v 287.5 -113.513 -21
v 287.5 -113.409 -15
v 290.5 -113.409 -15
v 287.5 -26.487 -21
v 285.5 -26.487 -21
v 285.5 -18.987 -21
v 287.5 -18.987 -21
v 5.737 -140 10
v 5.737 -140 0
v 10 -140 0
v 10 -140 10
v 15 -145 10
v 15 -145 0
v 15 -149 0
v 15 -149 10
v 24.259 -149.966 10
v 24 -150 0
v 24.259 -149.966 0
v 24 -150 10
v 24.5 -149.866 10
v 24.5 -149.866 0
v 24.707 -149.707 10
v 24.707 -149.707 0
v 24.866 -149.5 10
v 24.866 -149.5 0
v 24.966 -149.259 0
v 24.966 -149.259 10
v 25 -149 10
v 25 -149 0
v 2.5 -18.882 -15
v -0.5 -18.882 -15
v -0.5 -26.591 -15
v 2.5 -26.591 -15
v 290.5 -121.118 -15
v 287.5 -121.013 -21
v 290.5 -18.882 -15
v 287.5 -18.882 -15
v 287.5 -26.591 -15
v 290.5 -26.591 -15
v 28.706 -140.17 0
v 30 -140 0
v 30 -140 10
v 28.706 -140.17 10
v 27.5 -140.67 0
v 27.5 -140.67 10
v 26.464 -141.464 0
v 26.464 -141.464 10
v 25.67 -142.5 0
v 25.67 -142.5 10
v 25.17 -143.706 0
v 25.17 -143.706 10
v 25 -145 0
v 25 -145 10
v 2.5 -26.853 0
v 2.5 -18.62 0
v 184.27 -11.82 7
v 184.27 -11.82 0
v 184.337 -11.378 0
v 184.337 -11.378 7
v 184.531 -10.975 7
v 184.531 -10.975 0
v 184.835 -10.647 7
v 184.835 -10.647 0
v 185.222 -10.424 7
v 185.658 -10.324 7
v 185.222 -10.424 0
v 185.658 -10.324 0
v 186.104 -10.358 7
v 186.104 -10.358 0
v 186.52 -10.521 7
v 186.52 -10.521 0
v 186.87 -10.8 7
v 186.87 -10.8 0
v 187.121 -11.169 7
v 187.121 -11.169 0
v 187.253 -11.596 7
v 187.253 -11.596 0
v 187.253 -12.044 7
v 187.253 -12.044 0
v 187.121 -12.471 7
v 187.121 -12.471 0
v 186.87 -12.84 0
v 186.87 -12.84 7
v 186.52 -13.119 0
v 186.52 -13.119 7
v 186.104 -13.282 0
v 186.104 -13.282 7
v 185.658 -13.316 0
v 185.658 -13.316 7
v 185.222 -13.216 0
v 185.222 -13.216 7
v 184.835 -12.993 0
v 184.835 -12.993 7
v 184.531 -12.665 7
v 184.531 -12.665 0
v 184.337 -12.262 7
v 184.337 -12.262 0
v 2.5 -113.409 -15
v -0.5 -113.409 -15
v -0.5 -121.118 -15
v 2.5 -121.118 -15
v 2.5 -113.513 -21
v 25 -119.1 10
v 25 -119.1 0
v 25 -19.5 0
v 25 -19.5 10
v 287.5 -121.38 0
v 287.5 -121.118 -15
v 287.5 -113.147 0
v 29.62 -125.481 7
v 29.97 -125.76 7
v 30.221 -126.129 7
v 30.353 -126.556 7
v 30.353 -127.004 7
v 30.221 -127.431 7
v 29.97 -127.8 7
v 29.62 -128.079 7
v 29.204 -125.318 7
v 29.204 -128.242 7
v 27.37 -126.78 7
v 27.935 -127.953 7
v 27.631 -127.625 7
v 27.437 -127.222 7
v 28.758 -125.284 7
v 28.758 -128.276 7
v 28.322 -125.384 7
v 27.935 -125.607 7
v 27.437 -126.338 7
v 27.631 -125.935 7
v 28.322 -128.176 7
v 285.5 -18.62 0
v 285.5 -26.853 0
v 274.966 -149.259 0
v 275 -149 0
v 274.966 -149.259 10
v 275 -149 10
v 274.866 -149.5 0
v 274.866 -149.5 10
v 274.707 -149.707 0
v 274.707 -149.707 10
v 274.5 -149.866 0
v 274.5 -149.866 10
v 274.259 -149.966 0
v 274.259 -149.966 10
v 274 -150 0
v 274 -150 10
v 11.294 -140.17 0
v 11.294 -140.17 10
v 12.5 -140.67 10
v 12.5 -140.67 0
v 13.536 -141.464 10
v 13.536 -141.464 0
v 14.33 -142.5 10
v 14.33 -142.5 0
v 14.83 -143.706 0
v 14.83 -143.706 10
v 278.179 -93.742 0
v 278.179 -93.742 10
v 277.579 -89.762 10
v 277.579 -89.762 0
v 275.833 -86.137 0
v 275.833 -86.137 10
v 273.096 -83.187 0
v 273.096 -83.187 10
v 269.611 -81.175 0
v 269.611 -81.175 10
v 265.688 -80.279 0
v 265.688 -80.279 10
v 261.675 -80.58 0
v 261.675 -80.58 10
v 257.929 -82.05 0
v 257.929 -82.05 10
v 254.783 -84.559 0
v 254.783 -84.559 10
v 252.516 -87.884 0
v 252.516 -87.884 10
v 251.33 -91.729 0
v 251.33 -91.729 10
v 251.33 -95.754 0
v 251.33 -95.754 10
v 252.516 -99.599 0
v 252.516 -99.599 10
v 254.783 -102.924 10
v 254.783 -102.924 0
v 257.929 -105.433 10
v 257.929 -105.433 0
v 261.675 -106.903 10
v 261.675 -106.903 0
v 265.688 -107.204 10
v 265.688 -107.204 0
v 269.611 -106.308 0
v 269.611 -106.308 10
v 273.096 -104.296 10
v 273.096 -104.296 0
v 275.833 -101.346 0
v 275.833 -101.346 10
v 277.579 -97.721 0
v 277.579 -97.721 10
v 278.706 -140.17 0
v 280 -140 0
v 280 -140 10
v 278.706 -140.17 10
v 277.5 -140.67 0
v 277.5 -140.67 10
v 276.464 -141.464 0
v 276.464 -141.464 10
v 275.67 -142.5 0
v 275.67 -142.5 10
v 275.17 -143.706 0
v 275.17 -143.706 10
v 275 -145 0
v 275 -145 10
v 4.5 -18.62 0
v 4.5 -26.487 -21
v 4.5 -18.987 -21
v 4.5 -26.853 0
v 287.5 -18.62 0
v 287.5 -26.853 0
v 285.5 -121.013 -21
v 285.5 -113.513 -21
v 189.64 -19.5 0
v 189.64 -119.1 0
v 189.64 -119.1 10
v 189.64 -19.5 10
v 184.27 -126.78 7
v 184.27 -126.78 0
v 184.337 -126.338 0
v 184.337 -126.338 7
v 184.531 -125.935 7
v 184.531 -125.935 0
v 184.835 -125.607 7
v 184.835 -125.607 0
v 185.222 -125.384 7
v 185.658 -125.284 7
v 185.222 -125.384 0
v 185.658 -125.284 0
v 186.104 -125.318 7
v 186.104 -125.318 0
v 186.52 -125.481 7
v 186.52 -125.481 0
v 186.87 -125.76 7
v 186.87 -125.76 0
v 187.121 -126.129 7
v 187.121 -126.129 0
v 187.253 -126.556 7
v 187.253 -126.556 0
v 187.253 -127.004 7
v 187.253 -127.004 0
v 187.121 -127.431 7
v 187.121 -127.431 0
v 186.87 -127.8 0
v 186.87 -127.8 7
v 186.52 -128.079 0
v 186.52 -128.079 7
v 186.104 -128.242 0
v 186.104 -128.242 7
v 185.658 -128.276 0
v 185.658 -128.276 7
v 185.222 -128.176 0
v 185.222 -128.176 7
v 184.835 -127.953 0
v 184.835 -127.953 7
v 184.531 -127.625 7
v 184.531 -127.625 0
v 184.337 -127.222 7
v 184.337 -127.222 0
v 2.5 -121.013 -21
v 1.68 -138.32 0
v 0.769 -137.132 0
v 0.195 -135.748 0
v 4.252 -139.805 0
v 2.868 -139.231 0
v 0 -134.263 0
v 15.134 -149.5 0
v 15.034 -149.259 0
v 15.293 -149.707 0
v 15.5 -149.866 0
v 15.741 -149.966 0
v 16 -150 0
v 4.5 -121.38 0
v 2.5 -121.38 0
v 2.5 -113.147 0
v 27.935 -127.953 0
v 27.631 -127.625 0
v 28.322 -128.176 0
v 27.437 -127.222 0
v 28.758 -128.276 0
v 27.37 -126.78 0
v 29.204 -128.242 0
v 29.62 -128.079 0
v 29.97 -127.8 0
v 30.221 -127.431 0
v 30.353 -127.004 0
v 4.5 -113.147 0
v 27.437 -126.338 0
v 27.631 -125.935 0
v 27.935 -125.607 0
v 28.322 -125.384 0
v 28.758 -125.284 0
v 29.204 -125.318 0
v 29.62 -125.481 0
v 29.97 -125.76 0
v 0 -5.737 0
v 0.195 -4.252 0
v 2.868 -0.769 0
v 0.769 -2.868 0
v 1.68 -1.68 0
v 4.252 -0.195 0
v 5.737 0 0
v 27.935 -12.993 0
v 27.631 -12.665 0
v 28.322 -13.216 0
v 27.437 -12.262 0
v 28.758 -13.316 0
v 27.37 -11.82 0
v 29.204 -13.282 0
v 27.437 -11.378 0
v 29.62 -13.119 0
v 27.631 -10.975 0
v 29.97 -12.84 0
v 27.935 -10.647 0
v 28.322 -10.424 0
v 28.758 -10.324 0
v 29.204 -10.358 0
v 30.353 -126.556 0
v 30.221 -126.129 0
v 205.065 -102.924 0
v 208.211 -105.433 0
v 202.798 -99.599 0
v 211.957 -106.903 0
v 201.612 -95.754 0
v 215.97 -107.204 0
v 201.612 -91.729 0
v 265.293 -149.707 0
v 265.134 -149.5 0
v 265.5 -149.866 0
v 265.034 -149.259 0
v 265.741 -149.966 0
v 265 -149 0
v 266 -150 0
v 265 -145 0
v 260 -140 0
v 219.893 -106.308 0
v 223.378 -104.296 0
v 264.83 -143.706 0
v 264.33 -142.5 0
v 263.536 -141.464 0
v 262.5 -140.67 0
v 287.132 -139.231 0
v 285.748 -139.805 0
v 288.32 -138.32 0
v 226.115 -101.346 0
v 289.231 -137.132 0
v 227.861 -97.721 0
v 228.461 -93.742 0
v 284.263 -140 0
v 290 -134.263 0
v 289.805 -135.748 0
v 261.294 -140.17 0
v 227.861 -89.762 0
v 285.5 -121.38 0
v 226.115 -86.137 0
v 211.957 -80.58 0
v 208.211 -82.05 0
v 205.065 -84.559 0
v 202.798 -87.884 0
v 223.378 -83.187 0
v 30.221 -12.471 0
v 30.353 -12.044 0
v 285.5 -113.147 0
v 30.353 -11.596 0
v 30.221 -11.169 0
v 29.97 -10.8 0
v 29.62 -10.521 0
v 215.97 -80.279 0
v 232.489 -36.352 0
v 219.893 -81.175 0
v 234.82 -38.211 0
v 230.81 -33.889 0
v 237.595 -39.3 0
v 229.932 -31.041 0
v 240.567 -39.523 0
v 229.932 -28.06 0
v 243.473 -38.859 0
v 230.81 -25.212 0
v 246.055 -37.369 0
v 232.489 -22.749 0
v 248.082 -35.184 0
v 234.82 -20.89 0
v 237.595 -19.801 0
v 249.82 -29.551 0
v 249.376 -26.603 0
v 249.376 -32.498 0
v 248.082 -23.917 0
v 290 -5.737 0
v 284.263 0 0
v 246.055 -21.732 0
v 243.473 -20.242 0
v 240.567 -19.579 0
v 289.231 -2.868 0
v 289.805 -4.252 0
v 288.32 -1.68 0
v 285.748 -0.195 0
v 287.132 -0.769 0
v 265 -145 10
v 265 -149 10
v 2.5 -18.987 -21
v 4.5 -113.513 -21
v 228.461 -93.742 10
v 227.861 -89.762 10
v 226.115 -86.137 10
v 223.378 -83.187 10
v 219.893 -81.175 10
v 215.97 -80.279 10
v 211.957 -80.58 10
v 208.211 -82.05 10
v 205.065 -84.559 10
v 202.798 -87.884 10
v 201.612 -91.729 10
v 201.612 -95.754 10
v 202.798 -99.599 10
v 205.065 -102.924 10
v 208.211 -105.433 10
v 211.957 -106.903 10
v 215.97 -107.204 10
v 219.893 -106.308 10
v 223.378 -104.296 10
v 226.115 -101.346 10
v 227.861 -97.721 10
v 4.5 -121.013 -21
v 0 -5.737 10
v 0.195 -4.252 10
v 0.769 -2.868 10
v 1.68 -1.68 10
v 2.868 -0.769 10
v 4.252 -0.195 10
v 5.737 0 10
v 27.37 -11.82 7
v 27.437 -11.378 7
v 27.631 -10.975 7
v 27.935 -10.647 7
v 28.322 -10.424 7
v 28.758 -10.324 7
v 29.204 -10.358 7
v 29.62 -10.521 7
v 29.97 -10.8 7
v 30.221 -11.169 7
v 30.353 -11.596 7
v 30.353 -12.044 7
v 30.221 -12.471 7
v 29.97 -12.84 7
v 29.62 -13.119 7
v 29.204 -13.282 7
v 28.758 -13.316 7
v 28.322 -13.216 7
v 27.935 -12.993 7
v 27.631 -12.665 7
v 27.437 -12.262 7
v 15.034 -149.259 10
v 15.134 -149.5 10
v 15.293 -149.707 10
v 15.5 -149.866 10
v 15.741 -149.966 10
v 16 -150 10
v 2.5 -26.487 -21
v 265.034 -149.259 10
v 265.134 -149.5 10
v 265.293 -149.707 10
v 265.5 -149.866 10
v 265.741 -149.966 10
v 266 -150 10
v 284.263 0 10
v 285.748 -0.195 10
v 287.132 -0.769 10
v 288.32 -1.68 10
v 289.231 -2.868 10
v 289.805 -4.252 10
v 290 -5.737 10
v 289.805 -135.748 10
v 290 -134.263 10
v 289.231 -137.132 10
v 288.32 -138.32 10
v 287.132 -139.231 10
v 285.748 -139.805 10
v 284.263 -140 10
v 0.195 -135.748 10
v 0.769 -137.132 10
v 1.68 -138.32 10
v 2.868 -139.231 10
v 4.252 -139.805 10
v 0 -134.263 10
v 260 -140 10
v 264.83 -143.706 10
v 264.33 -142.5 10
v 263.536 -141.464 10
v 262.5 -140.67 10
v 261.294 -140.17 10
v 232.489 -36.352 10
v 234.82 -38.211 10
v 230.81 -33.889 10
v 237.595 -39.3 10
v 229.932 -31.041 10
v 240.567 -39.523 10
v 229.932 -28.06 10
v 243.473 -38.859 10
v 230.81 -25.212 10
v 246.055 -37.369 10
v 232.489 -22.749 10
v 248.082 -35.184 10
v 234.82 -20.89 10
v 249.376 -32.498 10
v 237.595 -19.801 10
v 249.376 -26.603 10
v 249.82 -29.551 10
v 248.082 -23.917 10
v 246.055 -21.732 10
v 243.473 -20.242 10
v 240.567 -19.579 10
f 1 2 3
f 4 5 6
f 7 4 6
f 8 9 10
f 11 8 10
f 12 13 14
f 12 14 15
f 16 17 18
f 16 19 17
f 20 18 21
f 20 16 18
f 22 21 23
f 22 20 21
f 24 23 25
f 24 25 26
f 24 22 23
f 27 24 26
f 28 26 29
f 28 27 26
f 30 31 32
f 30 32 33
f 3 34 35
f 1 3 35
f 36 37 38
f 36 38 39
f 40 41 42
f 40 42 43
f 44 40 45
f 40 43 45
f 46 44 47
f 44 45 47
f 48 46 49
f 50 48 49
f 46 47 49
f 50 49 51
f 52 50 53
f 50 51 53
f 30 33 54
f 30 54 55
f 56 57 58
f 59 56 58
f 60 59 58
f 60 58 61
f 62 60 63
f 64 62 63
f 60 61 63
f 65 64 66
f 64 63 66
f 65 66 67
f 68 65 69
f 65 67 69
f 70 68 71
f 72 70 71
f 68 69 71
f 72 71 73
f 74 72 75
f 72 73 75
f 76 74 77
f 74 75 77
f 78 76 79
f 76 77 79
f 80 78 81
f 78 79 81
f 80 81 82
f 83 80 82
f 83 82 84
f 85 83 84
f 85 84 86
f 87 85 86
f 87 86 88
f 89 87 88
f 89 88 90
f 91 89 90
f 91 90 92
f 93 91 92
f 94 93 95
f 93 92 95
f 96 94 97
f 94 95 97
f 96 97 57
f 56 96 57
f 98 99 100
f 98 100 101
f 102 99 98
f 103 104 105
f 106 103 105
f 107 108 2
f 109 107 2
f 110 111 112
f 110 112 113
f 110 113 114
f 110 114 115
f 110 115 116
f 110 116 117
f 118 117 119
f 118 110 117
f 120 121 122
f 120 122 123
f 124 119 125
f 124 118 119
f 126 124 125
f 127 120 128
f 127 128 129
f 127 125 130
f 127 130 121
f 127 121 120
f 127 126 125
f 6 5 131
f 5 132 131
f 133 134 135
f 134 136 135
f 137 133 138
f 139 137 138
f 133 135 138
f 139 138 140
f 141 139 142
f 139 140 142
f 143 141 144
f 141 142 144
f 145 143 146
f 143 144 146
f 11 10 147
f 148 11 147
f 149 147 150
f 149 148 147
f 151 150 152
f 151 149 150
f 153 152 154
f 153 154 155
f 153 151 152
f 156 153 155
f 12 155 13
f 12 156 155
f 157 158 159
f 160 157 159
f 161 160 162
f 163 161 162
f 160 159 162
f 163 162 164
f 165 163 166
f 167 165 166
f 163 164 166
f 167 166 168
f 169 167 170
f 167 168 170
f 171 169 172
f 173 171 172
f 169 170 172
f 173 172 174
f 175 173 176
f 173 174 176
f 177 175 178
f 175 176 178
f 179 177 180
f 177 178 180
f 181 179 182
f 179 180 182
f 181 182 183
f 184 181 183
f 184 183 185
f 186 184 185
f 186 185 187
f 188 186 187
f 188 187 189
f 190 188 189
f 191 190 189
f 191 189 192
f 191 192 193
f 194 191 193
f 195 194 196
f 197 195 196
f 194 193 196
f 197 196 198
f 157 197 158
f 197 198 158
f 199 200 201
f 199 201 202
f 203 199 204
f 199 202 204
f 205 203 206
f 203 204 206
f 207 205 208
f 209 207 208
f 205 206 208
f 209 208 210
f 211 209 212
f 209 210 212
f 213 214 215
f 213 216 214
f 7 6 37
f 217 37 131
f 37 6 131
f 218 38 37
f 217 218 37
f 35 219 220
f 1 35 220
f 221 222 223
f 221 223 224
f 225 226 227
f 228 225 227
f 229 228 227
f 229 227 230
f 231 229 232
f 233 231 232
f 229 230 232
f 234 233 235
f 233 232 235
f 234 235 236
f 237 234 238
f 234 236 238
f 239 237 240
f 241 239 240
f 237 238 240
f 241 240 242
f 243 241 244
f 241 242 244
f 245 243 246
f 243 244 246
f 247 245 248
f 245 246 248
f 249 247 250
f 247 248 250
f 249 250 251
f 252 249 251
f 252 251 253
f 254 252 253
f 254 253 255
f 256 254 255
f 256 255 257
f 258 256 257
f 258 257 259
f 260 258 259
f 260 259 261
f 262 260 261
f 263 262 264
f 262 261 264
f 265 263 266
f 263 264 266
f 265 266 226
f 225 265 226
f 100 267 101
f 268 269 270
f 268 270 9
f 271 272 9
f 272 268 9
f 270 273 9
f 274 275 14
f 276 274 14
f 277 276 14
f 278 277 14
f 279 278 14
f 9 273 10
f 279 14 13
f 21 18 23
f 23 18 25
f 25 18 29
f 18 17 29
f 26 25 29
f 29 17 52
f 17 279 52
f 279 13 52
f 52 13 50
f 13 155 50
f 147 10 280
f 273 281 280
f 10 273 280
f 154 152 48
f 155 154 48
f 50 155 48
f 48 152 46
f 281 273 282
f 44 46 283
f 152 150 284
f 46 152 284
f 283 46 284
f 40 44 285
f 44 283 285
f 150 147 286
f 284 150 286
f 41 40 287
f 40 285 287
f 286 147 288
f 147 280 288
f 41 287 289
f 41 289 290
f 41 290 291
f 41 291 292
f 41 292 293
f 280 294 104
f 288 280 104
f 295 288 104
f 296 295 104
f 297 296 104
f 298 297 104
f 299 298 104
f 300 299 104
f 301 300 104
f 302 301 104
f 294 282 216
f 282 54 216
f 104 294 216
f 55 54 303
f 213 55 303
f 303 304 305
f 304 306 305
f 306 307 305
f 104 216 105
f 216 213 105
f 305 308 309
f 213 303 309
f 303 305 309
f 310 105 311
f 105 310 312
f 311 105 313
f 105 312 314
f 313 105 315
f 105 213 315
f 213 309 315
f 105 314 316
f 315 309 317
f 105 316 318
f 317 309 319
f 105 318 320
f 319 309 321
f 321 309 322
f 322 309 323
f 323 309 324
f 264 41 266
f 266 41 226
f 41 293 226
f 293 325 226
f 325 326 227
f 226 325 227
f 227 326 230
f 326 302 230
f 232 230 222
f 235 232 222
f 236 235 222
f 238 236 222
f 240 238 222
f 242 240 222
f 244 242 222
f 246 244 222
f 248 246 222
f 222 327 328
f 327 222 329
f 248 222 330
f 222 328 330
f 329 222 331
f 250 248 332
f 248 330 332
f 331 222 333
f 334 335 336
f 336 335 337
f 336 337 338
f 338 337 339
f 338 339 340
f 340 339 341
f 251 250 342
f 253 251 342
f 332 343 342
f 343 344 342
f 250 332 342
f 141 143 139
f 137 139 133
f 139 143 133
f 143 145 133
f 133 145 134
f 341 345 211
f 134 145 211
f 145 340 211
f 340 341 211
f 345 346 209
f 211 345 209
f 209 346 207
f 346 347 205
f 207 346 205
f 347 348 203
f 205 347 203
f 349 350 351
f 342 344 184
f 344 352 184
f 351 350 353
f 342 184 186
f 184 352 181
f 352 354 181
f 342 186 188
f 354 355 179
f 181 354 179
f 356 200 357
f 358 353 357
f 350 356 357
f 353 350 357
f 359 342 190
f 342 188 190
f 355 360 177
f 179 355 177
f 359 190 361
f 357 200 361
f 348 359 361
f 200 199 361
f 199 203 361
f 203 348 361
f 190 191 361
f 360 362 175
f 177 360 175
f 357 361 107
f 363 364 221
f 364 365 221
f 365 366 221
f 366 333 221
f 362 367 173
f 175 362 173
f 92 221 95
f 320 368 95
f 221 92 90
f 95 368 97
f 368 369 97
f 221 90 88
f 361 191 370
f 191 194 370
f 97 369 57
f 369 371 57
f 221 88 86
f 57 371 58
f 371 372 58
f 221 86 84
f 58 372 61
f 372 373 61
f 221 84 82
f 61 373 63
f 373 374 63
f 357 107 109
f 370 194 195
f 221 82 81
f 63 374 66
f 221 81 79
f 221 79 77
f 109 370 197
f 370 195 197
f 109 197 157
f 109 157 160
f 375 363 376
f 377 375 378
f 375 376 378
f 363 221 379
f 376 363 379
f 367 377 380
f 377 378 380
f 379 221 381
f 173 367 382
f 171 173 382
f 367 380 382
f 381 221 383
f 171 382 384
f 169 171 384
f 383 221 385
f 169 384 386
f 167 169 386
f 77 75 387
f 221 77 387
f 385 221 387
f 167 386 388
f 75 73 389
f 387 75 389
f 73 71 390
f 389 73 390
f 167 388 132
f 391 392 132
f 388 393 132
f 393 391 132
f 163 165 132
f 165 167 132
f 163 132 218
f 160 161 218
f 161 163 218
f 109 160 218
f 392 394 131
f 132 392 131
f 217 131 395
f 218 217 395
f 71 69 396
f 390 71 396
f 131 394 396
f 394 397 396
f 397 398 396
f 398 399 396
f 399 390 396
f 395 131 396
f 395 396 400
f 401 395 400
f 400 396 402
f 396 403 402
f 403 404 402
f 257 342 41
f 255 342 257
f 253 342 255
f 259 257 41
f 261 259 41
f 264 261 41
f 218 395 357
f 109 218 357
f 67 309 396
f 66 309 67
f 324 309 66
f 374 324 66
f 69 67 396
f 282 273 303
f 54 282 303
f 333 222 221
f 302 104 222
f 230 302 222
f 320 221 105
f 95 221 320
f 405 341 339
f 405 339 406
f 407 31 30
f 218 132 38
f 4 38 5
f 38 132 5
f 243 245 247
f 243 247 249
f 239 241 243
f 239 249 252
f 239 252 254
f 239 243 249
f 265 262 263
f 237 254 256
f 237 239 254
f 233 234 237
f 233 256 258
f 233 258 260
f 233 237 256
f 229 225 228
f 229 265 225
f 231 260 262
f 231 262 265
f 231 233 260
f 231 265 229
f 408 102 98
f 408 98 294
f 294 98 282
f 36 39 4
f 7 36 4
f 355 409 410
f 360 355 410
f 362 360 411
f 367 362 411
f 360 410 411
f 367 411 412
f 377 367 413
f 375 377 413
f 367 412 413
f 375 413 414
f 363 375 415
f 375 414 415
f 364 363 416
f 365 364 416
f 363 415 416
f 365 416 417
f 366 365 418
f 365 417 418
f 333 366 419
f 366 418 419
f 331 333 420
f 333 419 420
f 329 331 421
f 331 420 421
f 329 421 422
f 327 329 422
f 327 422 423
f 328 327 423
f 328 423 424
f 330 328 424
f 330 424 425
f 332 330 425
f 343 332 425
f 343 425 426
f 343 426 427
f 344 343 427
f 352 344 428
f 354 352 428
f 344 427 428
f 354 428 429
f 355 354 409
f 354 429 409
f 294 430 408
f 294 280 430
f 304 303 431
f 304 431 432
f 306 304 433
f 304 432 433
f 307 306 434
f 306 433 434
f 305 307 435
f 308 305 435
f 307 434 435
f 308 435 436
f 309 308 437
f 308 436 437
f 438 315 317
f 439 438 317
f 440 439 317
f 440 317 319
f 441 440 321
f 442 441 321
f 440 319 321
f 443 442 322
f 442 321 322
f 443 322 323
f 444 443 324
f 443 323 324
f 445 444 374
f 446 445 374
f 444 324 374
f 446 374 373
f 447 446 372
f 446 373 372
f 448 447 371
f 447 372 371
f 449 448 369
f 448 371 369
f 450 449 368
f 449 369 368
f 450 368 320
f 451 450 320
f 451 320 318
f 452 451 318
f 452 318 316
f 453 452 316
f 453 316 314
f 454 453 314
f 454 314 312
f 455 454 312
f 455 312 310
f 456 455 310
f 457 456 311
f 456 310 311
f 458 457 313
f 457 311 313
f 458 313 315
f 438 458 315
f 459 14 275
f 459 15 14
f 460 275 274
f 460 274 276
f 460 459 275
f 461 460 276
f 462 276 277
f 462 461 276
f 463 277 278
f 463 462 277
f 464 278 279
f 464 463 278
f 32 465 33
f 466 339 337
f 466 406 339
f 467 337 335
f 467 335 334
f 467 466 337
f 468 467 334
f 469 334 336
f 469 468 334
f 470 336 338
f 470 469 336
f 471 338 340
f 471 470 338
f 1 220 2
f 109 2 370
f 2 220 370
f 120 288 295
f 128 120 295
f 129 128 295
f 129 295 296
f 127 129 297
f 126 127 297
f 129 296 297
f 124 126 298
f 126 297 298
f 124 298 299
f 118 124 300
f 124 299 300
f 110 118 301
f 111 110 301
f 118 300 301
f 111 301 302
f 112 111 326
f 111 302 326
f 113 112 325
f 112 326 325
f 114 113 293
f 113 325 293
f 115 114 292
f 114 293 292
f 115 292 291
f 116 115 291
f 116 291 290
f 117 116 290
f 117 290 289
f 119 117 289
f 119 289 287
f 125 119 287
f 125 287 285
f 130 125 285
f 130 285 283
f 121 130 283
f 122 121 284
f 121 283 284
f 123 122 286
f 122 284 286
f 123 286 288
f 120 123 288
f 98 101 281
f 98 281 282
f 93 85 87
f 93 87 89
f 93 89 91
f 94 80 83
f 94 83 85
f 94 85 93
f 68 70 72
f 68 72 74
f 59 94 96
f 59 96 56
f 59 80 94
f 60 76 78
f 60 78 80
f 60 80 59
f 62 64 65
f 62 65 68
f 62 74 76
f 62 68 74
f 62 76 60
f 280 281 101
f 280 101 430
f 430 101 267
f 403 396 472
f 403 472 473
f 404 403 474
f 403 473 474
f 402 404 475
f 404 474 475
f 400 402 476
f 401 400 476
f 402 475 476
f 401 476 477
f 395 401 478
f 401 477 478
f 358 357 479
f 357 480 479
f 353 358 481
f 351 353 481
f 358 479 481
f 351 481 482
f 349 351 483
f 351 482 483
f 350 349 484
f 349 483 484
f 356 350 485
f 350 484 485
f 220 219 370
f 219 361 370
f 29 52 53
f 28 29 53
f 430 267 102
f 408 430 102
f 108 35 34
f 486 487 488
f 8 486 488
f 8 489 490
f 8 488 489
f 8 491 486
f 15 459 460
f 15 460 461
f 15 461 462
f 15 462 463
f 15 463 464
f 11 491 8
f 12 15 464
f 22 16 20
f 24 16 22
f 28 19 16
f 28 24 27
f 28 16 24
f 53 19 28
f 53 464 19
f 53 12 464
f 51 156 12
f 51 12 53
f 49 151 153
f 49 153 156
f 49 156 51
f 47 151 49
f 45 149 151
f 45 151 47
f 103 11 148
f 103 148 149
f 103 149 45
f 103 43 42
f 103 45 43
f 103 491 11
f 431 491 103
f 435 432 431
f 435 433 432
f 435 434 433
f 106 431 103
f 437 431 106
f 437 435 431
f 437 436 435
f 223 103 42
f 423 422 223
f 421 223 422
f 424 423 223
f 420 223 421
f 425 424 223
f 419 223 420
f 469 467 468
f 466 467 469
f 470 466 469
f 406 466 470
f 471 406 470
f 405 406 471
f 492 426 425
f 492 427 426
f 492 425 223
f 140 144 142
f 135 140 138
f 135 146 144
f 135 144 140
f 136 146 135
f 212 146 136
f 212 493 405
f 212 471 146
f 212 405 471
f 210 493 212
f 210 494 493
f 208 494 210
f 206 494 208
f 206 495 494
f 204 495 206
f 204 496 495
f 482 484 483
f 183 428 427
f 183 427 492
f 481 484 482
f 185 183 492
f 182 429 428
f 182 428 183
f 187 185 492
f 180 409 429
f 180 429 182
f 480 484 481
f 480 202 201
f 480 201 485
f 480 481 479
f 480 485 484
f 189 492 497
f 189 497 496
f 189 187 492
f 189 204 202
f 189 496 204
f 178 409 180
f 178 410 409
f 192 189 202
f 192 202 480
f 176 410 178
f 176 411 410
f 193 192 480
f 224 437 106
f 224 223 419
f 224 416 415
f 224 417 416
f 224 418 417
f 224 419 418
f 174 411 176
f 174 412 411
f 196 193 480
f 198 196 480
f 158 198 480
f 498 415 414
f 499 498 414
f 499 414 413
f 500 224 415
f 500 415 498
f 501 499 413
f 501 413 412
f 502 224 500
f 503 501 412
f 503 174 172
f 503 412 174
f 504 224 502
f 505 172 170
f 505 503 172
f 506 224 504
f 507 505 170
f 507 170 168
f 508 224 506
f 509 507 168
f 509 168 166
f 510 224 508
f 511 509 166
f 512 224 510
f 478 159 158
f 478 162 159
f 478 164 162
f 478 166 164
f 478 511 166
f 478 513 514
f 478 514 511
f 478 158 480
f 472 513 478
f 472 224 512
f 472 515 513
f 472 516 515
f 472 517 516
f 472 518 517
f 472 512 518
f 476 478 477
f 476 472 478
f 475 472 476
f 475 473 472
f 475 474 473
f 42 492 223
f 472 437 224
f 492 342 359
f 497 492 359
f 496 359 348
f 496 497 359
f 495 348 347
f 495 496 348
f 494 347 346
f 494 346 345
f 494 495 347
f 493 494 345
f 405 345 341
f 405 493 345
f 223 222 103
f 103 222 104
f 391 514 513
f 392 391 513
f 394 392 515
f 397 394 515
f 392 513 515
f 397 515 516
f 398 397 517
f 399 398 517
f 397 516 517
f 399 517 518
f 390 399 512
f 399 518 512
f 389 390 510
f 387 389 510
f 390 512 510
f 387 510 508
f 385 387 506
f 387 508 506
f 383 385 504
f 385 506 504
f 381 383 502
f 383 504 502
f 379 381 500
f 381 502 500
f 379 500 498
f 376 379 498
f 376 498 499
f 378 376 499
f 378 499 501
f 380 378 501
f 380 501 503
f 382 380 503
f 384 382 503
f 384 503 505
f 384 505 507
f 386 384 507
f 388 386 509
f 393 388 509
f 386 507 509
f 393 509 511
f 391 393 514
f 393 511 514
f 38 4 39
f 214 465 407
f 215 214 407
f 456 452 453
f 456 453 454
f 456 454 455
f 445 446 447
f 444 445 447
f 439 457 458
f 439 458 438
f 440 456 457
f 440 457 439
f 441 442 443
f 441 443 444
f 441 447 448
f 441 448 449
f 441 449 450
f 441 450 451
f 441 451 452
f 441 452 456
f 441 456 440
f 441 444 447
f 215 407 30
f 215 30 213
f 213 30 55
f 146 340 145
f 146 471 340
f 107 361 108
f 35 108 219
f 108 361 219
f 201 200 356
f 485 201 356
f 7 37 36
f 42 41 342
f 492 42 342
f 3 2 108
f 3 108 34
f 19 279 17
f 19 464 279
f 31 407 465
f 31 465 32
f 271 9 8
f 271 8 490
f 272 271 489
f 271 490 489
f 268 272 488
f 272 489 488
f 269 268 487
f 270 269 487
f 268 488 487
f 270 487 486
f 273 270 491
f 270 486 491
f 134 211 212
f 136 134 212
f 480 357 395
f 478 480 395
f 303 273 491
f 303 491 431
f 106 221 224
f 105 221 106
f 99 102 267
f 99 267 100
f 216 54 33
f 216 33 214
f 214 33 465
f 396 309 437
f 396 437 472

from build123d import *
from OCP.BRepFilletAPI import BRepFilletAPI_MakeFillet

# Parameters (mm, degrees)
SKETCH1_W            = 290
SKETCH1_H            = 140
MAIN_BODY_DEPTH      = 10
SKETCH2_W            = 164.64
SKETCH2_H            = 99.6
DISPLAY_DEPTH        = 10
SKETCH5_W            = 10
SKETCH5_H            = 10
FEET_DEPTH           = 10
FEET_FILLETS_R1      = 5
FEET_FILLETS_R2      = 1
SKETCH8_R            = 10
ROTARY_ENCODER_DEPTH = 10
SKETCH9_R            = 13.5
CONNECTORS_DEPTH     = 10
SNAP_START           = 285.5
SNAP_HOOK1_DEPTH     = 2
SNAP_START_2         = -26.59133039
SNAP_HOOK1_2_DEPTH   = 7.70946078
SNAP_START_3         = 287.5
SNAP_HOOK1_3_DEPTH   = 3.5
SNAP_HOOK2_DEPTH     = 2
SNAP_START_4         = -121.11813039
SNAP_HOOK2_2_DEPTH   = 7.70946078
SNAP_HOOK2_3_DEPTH   = 3.5
SNAP_START_5         = 2.5
SNAP_HOOK3_DEPTH     = 2
SNAP_HOOK3_2_DEPTH   = 7.70946078
SNAP_START_6         = -1
SNAP_HOOK3_3_DEPTH   = 3.5
SNAP_HOOK4_DEPTH     = 2
SNAP_HOOK4_2_DEPTH   = 7.70946078
SNAP_HOOK4_3_DEPTH   = 3.5
SIDE_FILLETS_R       = 5.7366
SKETCH11_R           = 1.5
DISPLAY_HOLES_DEPTH  = 7


with BuildPart() as part:
    # Sketch1 → Main Body (new body)
    with BuildSketch(Plane.XY):
        with Locations((145, -70)):
            Rectangle(SKETCH1_W, SKETCH1_H)
    extrude(amount=MAIN_BODY_DEPTH)

    # Sketch2 → Display (cut)
    with BuildSketch(Plane(origin=(0, 0, 0), x_dir=(-1, 0, 0), z_dir=(0, 0, -1))):
        with Locations((-107.32, -69.3)):
            Rectangle(SKETCH2_W, SKETCH2_H)
    extrude(amount=-DISPLAY_DEPTH, mode=Mode.SUBTRACT)

    # Sketch5 → Feet (add)
    with BuildSketch(Plane.XZ.offset(140)):
        with Locations((20, 5)):
            Rectangle(SKETCH5_W, SKETCH5_H)
        with Locations((270, 5)):
            Rectangle(SKETCH5_W, SKETCH5_H)
    extrude(amount=FEET_DEPTH)

    # Feet Fillets: one fillet with a radius per group of edges: ONE call of the kernel's fillet builder (fillet() takes one radius for all edges)
    feet_fillets_edges_1 = [part.edges().sort_by_distance(p)[0] for p in [
        (15, -140, 5),
        (25, -140, 5),
        (275, -140, 5),
        (265, -140, 5),
    ]]
    feet_fillets_edges_2 = [part.edges().sort_by_distance(p)[0] for p in [
        (265, -150, 5),
        (275, -150, 5),
        (25, -150, 5),
        (15, -150, 5),
    ]]
    feet_fillets = BRepFilletAPI_MakeFillet(part.part.solid().wrapped)
    for e in feet_fillets_edges_1:
        feet_fillets.Add(FEET_FILLETS_R1, e.wrapped)
    for e in feet_fillets_edges_2:
        feet_fillets.Add(FEET_FILLETS_R2, e.wrapped)
    add(Compound.cast(feet_fillets.Shape()), mode=Mode.REPLACE)

    # Sketch8 → Rotary Encoder (cut)
    with BuildSketch(Plane.XY.offset(10)):
        with Locations((239.82, -29.550599566)):
            Circle(SKETCH8_R)
    extrude(amount=-ROTARY_ENCODER_DEPTH, mode=Mode.SUBTRACT)

    # Sketch9 → Connectors (cut)
    with BuildSketch(Plane.XY.offset(10)):
        with Locations((214.961120299, -93.741529743)):
            Circle(SKETCH9_R)
        with Locations((264.678879701, -93.741529743)):
            Circle(SKETCH9_R)
    extrude(amount=-CONNECTORS_DEPTH, mode=Mode.SUBTRACT)

    # Snap Hook1: read off the stored shape, not the designer's step
    # Snap Hook1 outline → Snap Hook1 (add)
    with BuildSketch(Plane.YZ.offset(SNAP_START)):
        Polygon((-26.4866, -21), (-18.9866, -21), (-18.620043637, 0), (-26.853156363, 0), align=None)
    extrude(amount=SNAP_HOOK1_DEPTH)

    # Snap Hook1 2 outline → Snap Hook1 2 (add)
    with BuildSketch(Plane(origin=(0, 0, 0), x_dir=(1, 0, 0), z_dir=(0, 1, 0)).offset(SNAP_START_2)):
        Polygon((287.5, 15), (290.5, 15), (287.5, 21), align=None)
    extrude(amount=SNAP_HOOK1_2_DEPTH)

    # Snap Hook1 3 outline → Snap Hook1 3 (cut)
    with BuildSketch(Plane.YZ.offset(SNAP_START_3)):
        Polygon((-18.881869611, -15), (-18.9866, -21), (-19.004055065, -22), (-18.88186961, -22), align=None)
        Polygon((-26.59133039, -22), (-26.469144935, -22), (-26.4866, -21), (-26.591330389, -15), align=None)
    extrude(amount=SNAP_HOOK1_3_DEPTH, mode=Mode.SUBTRACT)

    # Snap Hook2: read off the stored shape, not the designer's step
    # Snap Hook2 outline → Snap Hook2 (add)
    with BuildSketch(Plane.YZ.offset(SNAP_START)):
        Polygon((-121.0134, -21), (-113.5134, -21), (-113.146843637, 0), (-121.379956363, 0), align=None)
    extrude(amount=SNAP_HOOK2_DEPTH)

    # Snap Hook2 2 outline → Snap Hook2 2 (add)
    with BuildSketch(Plane(origin=(0, 0, 0), x_dir=(1, 0, 0), z_dir=(0, 1, 0)).offset(SNAP_START_4)):
        Polygon((287.5, 15), (290.5, 15), (287.5, 21), align=None)
    extrude(amount=SNAP_HOOK2_2_DEPTH)

    # Snap Hook2 3 outline → Snap Hook2 3 (cut)
    with BuildSketch(Plane.YZ.offset(SNAP_START_3)):
        Polygon((-113.408669611, -15), (-113.5134, -21), (-113.530855065, -22), (-113.40866961, -22), align=None)
        Polygon((-121.11813039, -22), (-120.995944935, -22), (-121.0134, -21), (-121.118130389, -15), align=None)
    extrude(amount=SNAP_HOOK2_3_DEPTH, mode=Mode.SUBTRACT)

    # Snap Hook3: read off the stored shape, not the designer's step
    # Snap Hook3 outline → Snap Hook3 (add)
    with BuildSketch(Plane.YZ.offset(SNAP_START_5)):
        Polygon((-26.4866, -21), (-18.9866, -21), (-18.620043637, 0), (-26.853156363, 0), align=None)
    extrude(amount=SNAP_HOOK3_DEPTH)

    # Snap Hook3 2 outline → Snap Hook3 2 (add)
    with BuildSketch(Plane(origin=(0, 0, 0), x_dir=(1, 0, 0), z_dir=(0, 1, 0)).offset(SNAP_START_2)):
        Polygon((2.5, 21), (-0.5, 15), (2.5, 15), align=None)
    extrude(amount=SNAP_HOOK3_2_DEPTH)

    # Snap Hook3 3 outline → Snap Hook3 3 (cut)
    with BuildSketch(Plane.YZ.offset(SNAP_START_6)):
        Polygon((-18.881869611, -15), (-18.9866, -21), (-19.004055065, -22), (-18.88186961, -22), align=None)
        Polygon((-26.59133039, -22), (-26.469144935, -22), (-26.4866, -21), (-26.591330389, -15), align=None)
    extrude(amount=SNAP_HOOK3_3_DEPTH, mode=Mode.SUBTRACT)

    # Snap Hook4: read off the stored shape, not the designer's step
    # Snap Hook4 outline → Snap Hook4 (add)
    with BuildSketch(Plane.YZ.offset(SNAP_START_5)):
        Polygon((-121.0134, -21), (-113.5134, -21), (-113.146843637, 0), (-121.379956363, 0), align=None)
    extrude(amount=SNAP_HOOK4_DEPTH)

    # Snap Hook4 2 outline → Snap Hook4 2 (add)
    with BuildSketch(Plane(origin=(0, 0, 0), x_dir=(1, 0, 0), z_dir=(0, 1, 0)).offset(SNAP_START_4)):
        Polygon((2.5, 21), (-0.5, 15), (2.5, 15), align=None)
    extrude(amount=SNAP_HOOK4_2_DEPTH)

    # Snap Hook4 3 outline → Snap Hook4 3 (cut)
    with BuildSketch(Plane.YZ.offset(SNAP_START_6)):
        Polygon((-113.408669611, -15), (-113.5134, -21), (-113.530855065, -22), (-113.40866961, -22), align=None)
        Polygon((-121.11813039, -22), (-120.995944935, -22), (-121.0134, -21), (-121.118130389, -15), align=None)
    extrude(amount=SNAP_HOOK4_3_DEPTH, mode=Mode.SUBTRACT)

    # Side Fillets
    side_fillets_edges = [part.edges().sort_by_distance(p)[0] for p in [
        (0, 0, 5),
        (290, 0, 5),
        (290, -140, 5),
        (0, -140, 5),
    ]]
    fillet(side_fillets_edges, radius=SIDE_FILLETS_R)

    # Sketch11 → Display Holes (cut)
    with BuildSketch(Plane(origin=(0, 0, 0), x_dir=(-1, 0, 0), z_dir=(0, 0, -1))):
        with Locations((-185.77, -11.82)):
            Circle(SKETCH11_R)
        with Locations((-28.87, -11.82)):
            Circle(SKETCH11_R)
        with Locations((-185.77, -126.78)):
            Circle(SKETCH11_R)
        with Locations((-28.87, -126.78)):
            Circle(SKETCH11_R)
    extrude(amount=-DISPLAY_HOLES_DEPTH, mode=Mode.SUBTRACT)


solid = part.part
